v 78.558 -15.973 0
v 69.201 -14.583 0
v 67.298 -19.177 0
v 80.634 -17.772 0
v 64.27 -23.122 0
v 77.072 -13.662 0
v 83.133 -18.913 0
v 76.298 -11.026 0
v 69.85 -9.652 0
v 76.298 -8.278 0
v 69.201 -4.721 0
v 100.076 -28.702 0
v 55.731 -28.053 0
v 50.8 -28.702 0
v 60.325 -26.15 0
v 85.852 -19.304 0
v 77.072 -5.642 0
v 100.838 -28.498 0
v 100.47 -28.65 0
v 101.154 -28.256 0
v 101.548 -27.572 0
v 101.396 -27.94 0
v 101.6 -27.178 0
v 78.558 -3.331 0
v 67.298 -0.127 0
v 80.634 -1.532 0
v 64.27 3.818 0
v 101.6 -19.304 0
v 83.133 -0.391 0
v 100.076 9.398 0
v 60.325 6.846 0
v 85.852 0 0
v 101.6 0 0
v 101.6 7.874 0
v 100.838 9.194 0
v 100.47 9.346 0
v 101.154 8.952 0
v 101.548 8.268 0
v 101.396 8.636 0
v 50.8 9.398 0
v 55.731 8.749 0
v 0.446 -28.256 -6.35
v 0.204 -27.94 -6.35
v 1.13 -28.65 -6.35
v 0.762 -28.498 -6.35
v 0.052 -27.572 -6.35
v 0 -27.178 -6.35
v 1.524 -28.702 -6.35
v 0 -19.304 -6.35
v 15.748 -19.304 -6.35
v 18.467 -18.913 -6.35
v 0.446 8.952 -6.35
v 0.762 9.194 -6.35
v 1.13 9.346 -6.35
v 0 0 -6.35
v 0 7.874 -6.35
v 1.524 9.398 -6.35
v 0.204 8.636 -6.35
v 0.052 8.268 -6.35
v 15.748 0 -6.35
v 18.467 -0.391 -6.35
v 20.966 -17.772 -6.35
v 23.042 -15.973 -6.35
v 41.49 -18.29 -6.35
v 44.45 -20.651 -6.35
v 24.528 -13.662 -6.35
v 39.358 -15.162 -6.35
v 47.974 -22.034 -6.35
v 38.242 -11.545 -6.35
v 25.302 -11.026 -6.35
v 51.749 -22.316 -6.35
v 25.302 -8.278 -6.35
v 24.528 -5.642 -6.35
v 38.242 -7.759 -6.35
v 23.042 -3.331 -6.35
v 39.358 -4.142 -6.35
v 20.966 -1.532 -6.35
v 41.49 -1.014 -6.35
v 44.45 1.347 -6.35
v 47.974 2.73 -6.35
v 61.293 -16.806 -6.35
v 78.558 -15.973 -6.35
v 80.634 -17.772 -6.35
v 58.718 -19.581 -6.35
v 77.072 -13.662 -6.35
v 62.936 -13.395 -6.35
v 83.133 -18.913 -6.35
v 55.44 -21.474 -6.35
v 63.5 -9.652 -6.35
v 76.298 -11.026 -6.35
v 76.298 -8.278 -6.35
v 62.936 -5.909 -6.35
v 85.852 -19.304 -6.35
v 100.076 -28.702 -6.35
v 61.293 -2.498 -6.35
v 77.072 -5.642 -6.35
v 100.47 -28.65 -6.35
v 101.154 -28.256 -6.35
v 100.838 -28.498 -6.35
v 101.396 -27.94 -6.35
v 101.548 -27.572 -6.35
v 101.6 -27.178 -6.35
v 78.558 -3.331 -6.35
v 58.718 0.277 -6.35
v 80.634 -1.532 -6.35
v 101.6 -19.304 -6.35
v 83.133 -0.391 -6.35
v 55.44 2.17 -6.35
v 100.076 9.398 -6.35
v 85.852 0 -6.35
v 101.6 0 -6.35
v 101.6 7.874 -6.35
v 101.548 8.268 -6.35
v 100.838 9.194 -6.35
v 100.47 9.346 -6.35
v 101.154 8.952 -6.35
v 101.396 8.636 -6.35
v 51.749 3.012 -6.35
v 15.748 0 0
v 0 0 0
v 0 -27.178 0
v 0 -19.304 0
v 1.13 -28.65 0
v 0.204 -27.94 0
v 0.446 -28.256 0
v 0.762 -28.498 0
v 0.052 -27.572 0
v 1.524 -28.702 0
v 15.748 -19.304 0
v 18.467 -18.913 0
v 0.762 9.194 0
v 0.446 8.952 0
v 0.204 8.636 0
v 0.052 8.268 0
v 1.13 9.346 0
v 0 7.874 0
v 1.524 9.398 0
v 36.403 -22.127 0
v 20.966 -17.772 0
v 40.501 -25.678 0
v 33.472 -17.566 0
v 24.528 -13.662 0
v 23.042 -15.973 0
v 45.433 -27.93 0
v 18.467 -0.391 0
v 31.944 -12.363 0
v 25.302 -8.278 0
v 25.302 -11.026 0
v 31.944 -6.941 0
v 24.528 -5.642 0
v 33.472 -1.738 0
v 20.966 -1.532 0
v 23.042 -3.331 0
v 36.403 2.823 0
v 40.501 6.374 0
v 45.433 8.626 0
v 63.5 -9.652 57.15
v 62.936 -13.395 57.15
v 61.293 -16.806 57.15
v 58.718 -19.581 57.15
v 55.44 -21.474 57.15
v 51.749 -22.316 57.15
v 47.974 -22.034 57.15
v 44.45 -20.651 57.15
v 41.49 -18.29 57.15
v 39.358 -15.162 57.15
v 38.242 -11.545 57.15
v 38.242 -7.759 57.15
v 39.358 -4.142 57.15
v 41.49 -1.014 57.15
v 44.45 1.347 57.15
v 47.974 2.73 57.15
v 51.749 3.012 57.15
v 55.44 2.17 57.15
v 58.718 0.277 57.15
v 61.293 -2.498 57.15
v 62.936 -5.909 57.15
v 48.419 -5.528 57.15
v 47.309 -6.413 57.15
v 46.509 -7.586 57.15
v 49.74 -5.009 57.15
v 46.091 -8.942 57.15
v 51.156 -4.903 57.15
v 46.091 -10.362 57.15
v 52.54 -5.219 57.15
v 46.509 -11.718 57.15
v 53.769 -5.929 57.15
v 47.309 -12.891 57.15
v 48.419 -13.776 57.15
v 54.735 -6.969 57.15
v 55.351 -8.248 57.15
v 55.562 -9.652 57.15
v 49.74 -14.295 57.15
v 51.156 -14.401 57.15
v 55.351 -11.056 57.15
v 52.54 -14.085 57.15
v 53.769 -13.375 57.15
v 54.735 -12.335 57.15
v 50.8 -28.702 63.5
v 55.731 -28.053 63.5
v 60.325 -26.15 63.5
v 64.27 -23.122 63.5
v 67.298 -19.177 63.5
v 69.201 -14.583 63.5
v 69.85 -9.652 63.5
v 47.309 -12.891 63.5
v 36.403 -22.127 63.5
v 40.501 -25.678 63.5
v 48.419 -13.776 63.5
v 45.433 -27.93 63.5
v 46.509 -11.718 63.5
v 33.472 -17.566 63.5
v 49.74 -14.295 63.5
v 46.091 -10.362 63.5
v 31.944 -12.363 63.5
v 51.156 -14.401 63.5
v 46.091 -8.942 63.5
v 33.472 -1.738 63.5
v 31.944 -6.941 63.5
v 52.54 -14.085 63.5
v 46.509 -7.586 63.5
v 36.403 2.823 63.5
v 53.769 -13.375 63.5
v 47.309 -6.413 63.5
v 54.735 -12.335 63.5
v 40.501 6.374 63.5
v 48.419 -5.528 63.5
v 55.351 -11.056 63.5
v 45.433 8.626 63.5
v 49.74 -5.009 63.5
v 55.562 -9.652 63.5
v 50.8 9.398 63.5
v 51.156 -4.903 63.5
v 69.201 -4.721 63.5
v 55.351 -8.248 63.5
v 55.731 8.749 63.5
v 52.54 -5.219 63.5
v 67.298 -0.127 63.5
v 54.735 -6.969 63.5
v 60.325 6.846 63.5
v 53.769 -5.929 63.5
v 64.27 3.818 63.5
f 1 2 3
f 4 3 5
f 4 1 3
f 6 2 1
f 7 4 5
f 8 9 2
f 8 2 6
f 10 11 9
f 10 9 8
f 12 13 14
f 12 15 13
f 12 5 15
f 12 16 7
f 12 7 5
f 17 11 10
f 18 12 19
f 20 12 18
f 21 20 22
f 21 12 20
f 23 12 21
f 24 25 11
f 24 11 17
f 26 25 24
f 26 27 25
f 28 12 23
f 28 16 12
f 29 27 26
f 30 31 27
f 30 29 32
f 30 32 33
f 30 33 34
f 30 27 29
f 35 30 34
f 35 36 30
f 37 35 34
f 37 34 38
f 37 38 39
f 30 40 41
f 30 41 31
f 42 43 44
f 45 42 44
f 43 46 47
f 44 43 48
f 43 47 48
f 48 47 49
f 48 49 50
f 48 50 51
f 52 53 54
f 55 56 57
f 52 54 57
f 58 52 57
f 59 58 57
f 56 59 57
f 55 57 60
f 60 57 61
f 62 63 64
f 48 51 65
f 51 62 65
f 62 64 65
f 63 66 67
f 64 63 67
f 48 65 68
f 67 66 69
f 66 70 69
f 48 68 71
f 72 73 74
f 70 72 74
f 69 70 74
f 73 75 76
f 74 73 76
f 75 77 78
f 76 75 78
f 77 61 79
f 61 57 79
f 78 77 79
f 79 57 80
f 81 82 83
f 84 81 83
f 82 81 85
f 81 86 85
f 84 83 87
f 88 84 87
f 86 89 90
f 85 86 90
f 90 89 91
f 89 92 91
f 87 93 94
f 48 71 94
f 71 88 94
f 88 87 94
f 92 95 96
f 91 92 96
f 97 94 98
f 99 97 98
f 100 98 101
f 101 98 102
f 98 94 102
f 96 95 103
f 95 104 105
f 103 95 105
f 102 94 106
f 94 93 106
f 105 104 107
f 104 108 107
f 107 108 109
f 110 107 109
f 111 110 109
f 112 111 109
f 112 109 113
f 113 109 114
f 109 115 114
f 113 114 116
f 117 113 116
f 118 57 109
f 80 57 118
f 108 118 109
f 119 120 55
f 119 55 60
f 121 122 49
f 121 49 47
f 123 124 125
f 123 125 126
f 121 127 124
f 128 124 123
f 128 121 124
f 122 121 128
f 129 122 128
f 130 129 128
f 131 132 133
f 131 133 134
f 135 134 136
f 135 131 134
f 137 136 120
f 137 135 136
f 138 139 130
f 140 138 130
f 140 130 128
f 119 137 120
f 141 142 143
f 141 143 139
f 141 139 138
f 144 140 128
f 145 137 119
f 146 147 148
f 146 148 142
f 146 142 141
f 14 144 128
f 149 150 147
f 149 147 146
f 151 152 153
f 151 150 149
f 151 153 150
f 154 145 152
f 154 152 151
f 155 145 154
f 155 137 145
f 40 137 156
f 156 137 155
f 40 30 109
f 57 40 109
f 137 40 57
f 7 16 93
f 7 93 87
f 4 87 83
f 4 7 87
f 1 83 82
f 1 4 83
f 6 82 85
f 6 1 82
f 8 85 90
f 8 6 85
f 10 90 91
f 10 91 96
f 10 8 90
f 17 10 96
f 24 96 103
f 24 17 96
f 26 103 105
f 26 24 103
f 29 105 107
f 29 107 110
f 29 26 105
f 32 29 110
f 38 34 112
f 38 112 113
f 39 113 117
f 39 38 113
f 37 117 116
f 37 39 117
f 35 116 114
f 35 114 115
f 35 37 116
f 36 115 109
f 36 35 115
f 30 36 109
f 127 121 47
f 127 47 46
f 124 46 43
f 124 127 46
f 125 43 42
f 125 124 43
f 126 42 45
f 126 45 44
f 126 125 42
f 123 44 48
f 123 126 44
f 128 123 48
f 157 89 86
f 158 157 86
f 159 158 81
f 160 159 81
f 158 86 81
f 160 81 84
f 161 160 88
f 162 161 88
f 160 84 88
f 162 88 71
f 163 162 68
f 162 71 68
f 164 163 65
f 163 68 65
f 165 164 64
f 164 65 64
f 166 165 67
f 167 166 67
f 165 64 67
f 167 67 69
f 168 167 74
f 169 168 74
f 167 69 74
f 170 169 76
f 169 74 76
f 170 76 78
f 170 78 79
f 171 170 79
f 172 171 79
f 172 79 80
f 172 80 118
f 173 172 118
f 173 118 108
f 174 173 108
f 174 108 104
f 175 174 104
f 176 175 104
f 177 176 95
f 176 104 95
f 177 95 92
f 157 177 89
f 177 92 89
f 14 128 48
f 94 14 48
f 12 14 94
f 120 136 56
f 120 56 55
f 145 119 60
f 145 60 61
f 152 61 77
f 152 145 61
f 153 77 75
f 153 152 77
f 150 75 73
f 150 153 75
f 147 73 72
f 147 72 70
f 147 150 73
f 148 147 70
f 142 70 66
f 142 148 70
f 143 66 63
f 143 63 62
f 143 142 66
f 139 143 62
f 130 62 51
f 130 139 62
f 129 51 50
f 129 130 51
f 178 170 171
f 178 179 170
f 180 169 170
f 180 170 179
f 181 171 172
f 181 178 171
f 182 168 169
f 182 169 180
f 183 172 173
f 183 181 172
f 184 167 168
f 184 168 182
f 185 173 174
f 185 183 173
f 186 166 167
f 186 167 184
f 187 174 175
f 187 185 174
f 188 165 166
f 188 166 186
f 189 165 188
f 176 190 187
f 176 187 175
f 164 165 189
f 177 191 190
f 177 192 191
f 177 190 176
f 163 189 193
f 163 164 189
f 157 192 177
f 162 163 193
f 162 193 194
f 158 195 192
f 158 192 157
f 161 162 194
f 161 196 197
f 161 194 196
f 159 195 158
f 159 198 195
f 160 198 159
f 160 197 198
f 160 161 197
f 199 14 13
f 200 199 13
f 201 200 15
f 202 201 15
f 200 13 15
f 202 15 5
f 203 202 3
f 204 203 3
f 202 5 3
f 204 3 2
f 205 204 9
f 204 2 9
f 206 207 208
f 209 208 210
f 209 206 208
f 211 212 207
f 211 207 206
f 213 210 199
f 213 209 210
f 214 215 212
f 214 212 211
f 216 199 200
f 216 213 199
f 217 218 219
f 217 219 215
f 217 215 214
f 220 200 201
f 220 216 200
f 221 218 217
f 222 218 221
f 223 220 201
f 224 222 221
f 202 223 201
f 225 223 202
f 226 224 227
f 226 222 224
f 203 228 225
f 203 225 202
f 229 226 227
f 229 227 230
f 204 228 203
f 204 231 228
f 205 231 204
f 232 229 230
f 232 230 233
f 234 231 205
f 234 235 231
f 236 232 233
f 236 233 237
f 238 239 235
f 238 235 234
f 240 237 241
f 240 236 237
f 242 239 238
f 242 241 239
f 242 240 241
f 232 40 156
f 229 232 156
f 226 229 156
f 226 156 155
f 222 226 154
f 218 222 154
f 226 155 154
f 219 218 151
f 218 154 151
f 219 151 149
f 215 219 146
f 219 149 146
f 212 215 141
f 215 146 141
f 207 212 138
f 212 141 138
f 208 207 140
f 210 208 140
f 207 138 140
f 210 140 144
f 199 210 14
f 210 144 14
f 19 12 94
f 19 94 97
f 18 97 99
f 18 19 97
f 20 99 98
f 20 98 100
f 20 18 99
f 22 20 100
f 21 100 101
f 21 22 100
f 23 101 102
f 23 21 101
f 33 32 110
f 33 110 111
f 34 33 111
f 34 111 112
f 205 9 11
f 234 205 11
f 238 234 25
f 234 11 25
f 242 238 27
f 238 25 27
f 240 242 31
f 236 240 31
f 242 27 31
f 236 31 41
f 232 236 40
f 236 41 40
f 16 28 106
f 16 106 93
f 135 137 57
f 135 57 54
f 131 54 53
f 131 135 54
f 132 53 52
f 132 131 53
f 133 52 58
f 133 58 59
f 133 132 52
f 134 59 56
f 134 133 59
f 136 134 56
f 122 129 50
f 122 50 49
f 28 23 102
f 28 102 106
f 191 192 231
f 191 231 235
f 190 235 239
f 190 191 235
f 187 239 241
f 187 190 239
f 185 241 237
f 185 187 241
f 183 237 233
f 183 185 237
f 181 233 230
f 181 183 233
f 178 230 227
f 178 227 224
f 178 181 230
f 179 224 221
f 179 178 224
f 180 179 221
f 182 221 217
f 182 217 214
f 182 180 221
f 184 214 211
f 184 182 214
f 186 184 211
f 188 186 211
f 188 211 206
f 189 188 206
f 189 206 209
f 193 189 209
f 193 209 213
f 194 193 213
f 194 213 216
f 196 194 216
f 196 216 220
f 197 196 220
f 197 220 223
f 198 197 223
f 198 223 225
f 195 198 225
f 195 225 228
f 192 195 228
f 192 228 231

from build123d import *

# Parameters (mm, degrees)
F1_DEPTH = 6.35
F2_R     = 4.7625
F3_DEPTH = 63.5
F4_R     = 12.7
F5_DEPTH = 63.5


with BuildPart() as f1:
    # F0 (on Top) → F1 (new body)
    with BuildSketch(Plane.XY):
        with BuildLine():
            Line((0, 7.874), (0, 0))
            Line((0, 0), (15.748, 0))
            ThreePointArc((15.748, 0), (25.4, -9.652), (15.748, -19.304))
            Line((15.748, -19.304), (0, -19.304))
            Line((0, -19.304), (0, -27.178))
            ThreePointArc((0, -27.178), (0.446369, -28.255631), (1.524, -28.702))
            Line((1.524, -28.702), (100.076, -28.702))
            ThreePointArc((100.076, -28.702), (101.153631, -28.255631), (101.6, -27.178))
            Line((101.6, -27.178), (101.6, -19.304))
            Line((101.6, -19.304), (85.852, -19.304))
            ThreePointArc((85.852, -19.304), (76.2, -9.652), (85.852, 0))
            Line((85.852, 0), (101.6, 0))
            Line((101.6, 0), (101.6, 7.874))
            ThreePointArc((101.6, 7.874), (101.153631, 8.951631), (100.076, 9.398))
            Line((100.076, 9.398), (1.524, 9.398))
            ThreePointArc((1.524, 9.398), (0.446369, 8.951631), (0, 7.874))
        make_face()
    extrude(amount=-F1_DEPTH)

    # F2 (on face) → F3 (join)
    with BuildSketch(Plane.XY):
        with BuildLine():
            ThreePointArc((50.8, -28.702), (64.270384, -23.122384), (69.85, -9.652))
            ThreePointArc((69.85, -9.652), (64.270384, 3.818384), (50.8, 9.398))
            ThreePointArc((50.8, 9.398), (31.75, -9.652), (50.8, -28.702))
        make_face()
        with Locations((50.8, -9.652)):
            Circle(F2_R, mode=Mode.SUBTRACT)
    extrude(amount=F3_DEPTH)

    # F4 (on face) → F5 (cut)
    with BuildSketch(Plane(origin=(0, 0, -6.35), x_dir=(1, 0, 0), z_dir=(0, 0, -1))):
        with Locations((50.8, 9.652)):
            Circle(F4_R)
    extrude(amount=-F5_DEPTH, mode=Mode.SUBTRACT)


solid = f1.part
